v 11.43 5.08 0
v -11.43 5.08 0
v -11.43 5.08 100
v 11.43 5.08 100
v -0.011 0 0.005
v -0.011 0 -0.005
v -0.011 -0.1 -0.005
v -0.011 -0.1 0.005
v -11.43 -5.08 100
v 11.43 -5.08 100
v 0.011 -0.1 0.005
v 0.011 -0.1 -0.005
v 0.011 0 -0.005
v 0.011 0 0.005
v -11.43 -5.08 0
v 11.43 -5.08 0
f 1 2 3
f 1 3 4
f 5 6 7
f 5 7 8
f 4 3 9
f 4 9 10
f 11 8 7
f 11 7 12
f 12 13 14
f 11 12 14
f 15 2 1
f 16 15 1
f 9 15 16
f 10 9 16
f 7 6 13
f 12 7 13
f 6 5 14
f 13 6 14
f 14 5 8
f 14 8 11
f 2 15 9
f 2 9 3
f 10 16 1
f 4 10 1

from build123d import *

# Parameters (mm, degrees)
RECTANGLE_W           = 22.86
RECTANGLE_H           = 10.16
EXTRUDE_DEPTH         = 100
CLONE_SCALE_SCALE     = 0.001
CLONE_PLACEMENT_ANGLE = 90


with BuildPart() as extrude_body:
    # Rectangle → Extrude (new body)
    with BuildSketch(Plane(origin=(-11.43, -5.08, 0), x_dir=(1, 0, 0), z_dir=(0, 0, 1))):
        with Locations((11.43, 5.08)):
            Rectangle(RECTANGLE_W, RECTANGLE_H)
    extrude(amount=EXTRUDE_DEPTH)


with BuildPart() as extrude001:
    # Clone base: copy of Extrude body
    add(extrude_body.part)


with BuildPart() as extrude001_1:
    # Clone scale: moved
    add(extrude001.part.scale(CLONE_SCALE_SCALE))


with BuildPart() as extrude001_2:
    # Clone placement: moved
    add(extrude001_1.part.rotate(Axis((0, 0, 0), (1, 0, 0)), CLONE_PLACEMENT_ANGLE))


solid = Compound([extrude_body.part, extrude001_2.part])
